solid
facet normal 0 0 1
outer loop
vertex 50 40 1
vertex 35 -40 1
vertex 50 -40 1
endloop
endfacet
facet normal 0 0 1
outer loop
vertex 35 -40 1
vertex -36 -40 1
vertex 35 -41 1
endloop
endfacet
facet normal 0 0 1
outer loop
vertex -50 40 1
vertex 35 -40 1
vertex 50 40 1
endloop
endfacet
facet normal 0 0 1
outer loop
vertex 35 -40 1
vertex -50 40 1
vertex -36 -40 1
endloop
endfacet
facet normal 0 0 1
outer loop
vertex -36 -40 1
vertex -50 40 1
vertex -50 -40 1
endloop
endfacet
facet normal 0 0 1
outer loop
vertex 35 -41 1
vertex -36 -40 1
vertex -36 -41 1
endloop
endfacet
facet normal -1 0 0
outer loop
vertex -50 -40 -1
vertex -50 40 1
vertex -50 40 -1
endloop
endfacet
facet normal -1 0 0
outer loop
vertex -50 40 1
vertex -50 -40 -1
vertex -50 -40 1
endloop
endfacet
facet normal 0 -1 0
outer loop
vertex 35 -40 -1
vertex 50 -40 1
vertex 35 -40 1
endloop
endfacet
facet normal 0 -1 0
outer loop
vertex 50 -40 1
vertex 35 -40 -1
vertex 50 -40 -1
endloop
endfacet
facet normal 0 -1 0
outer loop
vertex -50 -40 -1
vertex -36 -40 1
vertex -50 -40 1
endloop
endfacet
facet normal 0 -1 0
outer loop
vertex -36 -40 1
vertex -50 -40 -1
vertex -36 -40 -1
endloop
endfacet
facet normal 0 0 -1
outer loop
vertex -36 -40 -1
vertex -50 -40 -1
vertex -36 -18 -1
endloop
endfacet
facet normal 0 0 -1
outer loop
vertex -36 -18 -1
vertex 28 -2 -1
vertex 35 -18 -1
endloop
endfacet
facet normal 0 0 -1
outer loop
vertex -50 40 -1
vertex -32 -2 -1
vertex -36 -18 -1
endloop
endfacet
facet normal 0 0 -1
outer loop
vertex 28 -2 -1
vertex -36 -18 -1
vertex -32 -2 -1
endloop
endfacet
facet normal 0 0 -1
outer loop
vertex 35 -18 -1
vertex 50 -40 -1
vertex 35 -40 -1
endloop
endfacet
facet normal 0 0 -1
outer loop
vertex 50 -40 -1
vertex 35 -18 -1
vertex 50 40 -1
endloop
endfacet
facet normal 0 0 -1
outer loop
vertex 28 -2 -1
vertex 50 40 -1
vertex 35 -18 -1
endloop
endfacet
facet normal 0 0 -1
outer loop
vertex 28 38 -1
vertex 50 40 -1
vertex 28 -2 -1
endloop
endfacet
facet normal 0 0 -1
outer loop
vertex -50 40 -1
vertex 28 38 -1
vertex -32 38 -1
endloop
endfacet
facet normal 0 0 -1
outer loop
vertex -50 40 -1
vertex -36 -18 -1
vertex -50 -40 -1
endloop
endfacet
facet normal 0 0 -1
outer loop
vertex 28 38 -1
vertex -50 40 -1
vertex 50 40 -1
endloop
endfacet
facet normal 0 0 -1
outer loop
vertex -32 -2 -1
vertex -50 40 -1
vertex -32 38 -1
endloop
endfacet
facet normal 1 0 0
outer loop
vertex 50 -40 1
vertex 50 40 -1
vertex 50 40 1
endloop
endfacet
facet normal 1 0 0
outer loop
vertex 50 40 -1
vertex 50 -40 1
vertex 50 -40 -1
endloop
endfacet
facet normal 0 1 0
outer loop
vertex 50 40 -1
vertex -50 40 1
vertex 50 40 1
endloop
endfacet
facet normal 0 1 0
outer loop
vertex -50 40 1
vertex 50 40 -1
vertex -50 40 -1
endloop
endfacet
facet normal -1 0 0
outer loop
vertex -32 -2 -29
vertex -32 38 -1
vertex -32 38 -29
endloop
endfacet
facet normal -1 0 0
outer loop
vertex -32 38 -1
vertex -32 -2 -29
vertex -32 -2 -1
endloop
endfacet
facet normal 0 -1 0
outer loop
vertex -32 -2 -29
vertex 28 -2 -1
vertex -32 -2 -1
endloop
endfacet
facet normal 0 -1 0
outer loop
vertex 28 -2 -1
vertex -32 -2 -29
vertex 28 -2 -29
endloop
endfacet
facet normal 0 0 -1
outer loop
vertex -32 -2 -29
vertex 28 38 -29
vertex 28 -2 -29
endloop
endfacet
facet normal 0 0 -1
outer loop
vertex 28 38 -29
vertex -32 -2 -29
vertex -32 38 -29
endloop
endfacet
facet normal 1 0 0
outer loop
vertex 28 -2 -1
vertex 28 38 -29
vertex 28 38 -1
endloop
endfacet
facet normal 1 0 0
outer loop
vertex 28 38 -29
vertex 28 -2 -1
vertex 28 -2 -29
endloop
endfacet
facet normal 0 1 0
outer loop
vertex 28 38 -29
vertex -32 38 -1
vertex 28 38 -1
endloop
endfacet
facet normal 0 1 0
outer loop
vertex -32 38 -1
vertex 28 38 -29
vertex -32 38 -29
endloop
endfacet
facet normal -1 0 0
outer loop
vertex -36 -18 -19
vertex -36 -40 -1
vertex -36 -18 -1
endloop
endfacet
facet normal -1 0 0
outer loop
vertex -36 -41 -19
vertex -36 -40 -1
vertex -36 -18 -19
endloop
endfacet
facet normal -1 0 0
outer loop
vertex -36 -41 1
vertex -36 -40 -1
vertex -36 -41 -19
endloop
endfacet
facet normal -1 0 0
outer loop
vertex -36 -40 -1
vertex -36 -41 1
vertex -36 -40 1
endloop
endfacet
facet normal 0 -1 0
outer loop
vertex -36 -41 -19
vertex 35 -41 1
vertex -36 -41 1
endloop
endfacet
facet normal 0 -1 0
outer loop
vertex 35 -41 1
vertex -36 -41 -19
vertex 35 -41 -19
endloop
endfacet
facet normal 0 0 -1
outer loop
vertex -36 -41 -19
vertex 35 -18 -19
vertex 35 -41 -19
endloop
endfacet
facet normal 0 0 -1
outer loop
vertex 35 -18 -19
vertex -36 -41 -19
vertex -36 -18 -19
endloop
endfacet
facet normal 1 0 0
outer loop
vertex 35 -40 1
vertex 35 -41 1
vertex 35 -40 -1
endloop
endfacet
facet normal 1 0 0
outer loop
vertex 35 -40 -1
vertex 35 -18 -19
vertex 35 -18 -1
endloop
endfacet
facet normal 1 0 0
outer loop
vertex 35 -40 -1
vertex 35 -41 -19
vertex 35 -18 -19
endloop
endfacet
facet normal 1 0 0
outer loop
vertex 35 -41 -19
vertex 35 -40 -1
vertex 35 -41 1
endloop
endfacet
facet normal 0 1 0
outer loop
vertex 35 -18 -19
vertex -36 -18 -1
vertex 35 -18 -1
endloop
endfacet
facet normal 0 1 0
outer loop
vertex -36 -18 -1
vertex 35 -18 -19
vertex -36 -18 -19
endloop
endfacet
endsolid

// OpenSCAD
// file: utils.scad
include <standards.scad>;

module bolt(h, d, sink, baseL=5){
   	
	// Expand the bolt sink hole by this amount: 
	sinkExpFac = 1.1;
	
	// Gray bolts
    	color("Gray")
    	translate([0,0,sink])
    	union(){
	// bolt thread
    	translate([0,0,d/2]) cylinder(h=h, r=d/2);
	// bolt base
    	cylinder(h=d/2, r1=d*sinkExpFac, r2=d/2*sinkExpFac);
    	translate([0,0,-baseL - sink]) cylinder(h=baseL + sink, r=d*sinkExpFac);
    	}
}
// file: standards.scad
// BEARING:
BEARINGD = 11;
BEARINGT = 4;
BEARINGAXLED= 5;

// BOLTS:
BOLT3TIGHT=2.8;
BOLT3LOOSE=3.05;

// GEARS:
GEART = 6;
GEARMODUL = 1;
HELIXANGLE=45;

$fn = 0; //50000;
$fa = 1;
$fs = .3;
// main file
include <standards.scad>;
use <utils.scad>;

module jetson(key, heatsinkH=30){

	jetsonMountHoles = [[4, 17], [90, 17], [4, 75], [90, 75]];
	jetsonCorners = [[0,0], [100, 0], [100,80], [0, 80]];
	jetsonHeatSinkCorners = [[22, 38], [82, 38], [82, 78], [22, 78]];
	jetsonConnectorsCorners = [[15, -1], [86, -1], [86, 22], [15, 22]];

	mountH = 40;
	mountD = 9;
	breadboardT = 2;
	
	module jetson_(){
		translate([0,0,-breadboardT/2]){
		linear_extrude(height=breadboardT) polygon(points=jetsonCorners);	
		// Heatsink:
		linear_extrude(height=heatsinkH) polygon(points=jetsonHeatSinkCorners);
		linear_extrude(height=20) polygon(points=jetsonConnectorsCorners);
		}
	}
	module pole(){
		attachD = 5;
		transitionH = mountD - attachD;
		translate([0,0, breadboardT/2])
		difference(){
		union(){
		translate([0,0,transitionH])cylinder(h=mountH-transitionH, r=mountD/2);
		cylinder(h=transitionH, r1=attachD/2, r2=mountD/2);
		}
		bolt(6, BOLT3TIGHT, -BOLT3TIGHT/2);
		}

	}
	// mount bars:
	module mount(){
		mirror([0,0,1])
		for (p=jetsonMountHoles){
			translate(p) pole();	
	}
	}
	
		
	rotate([0,180,0])
	
	//mirror([0,0,1])
	translate([-jetsonCorners[1][0]/2, -jetsonCorners[2][1]/2, 0])
	if (key=="jetson"){jetson_();}
	else if (key=="mount"){mount();}
	else {jetson_(); mount();};
	
}

jetson("jetson");
